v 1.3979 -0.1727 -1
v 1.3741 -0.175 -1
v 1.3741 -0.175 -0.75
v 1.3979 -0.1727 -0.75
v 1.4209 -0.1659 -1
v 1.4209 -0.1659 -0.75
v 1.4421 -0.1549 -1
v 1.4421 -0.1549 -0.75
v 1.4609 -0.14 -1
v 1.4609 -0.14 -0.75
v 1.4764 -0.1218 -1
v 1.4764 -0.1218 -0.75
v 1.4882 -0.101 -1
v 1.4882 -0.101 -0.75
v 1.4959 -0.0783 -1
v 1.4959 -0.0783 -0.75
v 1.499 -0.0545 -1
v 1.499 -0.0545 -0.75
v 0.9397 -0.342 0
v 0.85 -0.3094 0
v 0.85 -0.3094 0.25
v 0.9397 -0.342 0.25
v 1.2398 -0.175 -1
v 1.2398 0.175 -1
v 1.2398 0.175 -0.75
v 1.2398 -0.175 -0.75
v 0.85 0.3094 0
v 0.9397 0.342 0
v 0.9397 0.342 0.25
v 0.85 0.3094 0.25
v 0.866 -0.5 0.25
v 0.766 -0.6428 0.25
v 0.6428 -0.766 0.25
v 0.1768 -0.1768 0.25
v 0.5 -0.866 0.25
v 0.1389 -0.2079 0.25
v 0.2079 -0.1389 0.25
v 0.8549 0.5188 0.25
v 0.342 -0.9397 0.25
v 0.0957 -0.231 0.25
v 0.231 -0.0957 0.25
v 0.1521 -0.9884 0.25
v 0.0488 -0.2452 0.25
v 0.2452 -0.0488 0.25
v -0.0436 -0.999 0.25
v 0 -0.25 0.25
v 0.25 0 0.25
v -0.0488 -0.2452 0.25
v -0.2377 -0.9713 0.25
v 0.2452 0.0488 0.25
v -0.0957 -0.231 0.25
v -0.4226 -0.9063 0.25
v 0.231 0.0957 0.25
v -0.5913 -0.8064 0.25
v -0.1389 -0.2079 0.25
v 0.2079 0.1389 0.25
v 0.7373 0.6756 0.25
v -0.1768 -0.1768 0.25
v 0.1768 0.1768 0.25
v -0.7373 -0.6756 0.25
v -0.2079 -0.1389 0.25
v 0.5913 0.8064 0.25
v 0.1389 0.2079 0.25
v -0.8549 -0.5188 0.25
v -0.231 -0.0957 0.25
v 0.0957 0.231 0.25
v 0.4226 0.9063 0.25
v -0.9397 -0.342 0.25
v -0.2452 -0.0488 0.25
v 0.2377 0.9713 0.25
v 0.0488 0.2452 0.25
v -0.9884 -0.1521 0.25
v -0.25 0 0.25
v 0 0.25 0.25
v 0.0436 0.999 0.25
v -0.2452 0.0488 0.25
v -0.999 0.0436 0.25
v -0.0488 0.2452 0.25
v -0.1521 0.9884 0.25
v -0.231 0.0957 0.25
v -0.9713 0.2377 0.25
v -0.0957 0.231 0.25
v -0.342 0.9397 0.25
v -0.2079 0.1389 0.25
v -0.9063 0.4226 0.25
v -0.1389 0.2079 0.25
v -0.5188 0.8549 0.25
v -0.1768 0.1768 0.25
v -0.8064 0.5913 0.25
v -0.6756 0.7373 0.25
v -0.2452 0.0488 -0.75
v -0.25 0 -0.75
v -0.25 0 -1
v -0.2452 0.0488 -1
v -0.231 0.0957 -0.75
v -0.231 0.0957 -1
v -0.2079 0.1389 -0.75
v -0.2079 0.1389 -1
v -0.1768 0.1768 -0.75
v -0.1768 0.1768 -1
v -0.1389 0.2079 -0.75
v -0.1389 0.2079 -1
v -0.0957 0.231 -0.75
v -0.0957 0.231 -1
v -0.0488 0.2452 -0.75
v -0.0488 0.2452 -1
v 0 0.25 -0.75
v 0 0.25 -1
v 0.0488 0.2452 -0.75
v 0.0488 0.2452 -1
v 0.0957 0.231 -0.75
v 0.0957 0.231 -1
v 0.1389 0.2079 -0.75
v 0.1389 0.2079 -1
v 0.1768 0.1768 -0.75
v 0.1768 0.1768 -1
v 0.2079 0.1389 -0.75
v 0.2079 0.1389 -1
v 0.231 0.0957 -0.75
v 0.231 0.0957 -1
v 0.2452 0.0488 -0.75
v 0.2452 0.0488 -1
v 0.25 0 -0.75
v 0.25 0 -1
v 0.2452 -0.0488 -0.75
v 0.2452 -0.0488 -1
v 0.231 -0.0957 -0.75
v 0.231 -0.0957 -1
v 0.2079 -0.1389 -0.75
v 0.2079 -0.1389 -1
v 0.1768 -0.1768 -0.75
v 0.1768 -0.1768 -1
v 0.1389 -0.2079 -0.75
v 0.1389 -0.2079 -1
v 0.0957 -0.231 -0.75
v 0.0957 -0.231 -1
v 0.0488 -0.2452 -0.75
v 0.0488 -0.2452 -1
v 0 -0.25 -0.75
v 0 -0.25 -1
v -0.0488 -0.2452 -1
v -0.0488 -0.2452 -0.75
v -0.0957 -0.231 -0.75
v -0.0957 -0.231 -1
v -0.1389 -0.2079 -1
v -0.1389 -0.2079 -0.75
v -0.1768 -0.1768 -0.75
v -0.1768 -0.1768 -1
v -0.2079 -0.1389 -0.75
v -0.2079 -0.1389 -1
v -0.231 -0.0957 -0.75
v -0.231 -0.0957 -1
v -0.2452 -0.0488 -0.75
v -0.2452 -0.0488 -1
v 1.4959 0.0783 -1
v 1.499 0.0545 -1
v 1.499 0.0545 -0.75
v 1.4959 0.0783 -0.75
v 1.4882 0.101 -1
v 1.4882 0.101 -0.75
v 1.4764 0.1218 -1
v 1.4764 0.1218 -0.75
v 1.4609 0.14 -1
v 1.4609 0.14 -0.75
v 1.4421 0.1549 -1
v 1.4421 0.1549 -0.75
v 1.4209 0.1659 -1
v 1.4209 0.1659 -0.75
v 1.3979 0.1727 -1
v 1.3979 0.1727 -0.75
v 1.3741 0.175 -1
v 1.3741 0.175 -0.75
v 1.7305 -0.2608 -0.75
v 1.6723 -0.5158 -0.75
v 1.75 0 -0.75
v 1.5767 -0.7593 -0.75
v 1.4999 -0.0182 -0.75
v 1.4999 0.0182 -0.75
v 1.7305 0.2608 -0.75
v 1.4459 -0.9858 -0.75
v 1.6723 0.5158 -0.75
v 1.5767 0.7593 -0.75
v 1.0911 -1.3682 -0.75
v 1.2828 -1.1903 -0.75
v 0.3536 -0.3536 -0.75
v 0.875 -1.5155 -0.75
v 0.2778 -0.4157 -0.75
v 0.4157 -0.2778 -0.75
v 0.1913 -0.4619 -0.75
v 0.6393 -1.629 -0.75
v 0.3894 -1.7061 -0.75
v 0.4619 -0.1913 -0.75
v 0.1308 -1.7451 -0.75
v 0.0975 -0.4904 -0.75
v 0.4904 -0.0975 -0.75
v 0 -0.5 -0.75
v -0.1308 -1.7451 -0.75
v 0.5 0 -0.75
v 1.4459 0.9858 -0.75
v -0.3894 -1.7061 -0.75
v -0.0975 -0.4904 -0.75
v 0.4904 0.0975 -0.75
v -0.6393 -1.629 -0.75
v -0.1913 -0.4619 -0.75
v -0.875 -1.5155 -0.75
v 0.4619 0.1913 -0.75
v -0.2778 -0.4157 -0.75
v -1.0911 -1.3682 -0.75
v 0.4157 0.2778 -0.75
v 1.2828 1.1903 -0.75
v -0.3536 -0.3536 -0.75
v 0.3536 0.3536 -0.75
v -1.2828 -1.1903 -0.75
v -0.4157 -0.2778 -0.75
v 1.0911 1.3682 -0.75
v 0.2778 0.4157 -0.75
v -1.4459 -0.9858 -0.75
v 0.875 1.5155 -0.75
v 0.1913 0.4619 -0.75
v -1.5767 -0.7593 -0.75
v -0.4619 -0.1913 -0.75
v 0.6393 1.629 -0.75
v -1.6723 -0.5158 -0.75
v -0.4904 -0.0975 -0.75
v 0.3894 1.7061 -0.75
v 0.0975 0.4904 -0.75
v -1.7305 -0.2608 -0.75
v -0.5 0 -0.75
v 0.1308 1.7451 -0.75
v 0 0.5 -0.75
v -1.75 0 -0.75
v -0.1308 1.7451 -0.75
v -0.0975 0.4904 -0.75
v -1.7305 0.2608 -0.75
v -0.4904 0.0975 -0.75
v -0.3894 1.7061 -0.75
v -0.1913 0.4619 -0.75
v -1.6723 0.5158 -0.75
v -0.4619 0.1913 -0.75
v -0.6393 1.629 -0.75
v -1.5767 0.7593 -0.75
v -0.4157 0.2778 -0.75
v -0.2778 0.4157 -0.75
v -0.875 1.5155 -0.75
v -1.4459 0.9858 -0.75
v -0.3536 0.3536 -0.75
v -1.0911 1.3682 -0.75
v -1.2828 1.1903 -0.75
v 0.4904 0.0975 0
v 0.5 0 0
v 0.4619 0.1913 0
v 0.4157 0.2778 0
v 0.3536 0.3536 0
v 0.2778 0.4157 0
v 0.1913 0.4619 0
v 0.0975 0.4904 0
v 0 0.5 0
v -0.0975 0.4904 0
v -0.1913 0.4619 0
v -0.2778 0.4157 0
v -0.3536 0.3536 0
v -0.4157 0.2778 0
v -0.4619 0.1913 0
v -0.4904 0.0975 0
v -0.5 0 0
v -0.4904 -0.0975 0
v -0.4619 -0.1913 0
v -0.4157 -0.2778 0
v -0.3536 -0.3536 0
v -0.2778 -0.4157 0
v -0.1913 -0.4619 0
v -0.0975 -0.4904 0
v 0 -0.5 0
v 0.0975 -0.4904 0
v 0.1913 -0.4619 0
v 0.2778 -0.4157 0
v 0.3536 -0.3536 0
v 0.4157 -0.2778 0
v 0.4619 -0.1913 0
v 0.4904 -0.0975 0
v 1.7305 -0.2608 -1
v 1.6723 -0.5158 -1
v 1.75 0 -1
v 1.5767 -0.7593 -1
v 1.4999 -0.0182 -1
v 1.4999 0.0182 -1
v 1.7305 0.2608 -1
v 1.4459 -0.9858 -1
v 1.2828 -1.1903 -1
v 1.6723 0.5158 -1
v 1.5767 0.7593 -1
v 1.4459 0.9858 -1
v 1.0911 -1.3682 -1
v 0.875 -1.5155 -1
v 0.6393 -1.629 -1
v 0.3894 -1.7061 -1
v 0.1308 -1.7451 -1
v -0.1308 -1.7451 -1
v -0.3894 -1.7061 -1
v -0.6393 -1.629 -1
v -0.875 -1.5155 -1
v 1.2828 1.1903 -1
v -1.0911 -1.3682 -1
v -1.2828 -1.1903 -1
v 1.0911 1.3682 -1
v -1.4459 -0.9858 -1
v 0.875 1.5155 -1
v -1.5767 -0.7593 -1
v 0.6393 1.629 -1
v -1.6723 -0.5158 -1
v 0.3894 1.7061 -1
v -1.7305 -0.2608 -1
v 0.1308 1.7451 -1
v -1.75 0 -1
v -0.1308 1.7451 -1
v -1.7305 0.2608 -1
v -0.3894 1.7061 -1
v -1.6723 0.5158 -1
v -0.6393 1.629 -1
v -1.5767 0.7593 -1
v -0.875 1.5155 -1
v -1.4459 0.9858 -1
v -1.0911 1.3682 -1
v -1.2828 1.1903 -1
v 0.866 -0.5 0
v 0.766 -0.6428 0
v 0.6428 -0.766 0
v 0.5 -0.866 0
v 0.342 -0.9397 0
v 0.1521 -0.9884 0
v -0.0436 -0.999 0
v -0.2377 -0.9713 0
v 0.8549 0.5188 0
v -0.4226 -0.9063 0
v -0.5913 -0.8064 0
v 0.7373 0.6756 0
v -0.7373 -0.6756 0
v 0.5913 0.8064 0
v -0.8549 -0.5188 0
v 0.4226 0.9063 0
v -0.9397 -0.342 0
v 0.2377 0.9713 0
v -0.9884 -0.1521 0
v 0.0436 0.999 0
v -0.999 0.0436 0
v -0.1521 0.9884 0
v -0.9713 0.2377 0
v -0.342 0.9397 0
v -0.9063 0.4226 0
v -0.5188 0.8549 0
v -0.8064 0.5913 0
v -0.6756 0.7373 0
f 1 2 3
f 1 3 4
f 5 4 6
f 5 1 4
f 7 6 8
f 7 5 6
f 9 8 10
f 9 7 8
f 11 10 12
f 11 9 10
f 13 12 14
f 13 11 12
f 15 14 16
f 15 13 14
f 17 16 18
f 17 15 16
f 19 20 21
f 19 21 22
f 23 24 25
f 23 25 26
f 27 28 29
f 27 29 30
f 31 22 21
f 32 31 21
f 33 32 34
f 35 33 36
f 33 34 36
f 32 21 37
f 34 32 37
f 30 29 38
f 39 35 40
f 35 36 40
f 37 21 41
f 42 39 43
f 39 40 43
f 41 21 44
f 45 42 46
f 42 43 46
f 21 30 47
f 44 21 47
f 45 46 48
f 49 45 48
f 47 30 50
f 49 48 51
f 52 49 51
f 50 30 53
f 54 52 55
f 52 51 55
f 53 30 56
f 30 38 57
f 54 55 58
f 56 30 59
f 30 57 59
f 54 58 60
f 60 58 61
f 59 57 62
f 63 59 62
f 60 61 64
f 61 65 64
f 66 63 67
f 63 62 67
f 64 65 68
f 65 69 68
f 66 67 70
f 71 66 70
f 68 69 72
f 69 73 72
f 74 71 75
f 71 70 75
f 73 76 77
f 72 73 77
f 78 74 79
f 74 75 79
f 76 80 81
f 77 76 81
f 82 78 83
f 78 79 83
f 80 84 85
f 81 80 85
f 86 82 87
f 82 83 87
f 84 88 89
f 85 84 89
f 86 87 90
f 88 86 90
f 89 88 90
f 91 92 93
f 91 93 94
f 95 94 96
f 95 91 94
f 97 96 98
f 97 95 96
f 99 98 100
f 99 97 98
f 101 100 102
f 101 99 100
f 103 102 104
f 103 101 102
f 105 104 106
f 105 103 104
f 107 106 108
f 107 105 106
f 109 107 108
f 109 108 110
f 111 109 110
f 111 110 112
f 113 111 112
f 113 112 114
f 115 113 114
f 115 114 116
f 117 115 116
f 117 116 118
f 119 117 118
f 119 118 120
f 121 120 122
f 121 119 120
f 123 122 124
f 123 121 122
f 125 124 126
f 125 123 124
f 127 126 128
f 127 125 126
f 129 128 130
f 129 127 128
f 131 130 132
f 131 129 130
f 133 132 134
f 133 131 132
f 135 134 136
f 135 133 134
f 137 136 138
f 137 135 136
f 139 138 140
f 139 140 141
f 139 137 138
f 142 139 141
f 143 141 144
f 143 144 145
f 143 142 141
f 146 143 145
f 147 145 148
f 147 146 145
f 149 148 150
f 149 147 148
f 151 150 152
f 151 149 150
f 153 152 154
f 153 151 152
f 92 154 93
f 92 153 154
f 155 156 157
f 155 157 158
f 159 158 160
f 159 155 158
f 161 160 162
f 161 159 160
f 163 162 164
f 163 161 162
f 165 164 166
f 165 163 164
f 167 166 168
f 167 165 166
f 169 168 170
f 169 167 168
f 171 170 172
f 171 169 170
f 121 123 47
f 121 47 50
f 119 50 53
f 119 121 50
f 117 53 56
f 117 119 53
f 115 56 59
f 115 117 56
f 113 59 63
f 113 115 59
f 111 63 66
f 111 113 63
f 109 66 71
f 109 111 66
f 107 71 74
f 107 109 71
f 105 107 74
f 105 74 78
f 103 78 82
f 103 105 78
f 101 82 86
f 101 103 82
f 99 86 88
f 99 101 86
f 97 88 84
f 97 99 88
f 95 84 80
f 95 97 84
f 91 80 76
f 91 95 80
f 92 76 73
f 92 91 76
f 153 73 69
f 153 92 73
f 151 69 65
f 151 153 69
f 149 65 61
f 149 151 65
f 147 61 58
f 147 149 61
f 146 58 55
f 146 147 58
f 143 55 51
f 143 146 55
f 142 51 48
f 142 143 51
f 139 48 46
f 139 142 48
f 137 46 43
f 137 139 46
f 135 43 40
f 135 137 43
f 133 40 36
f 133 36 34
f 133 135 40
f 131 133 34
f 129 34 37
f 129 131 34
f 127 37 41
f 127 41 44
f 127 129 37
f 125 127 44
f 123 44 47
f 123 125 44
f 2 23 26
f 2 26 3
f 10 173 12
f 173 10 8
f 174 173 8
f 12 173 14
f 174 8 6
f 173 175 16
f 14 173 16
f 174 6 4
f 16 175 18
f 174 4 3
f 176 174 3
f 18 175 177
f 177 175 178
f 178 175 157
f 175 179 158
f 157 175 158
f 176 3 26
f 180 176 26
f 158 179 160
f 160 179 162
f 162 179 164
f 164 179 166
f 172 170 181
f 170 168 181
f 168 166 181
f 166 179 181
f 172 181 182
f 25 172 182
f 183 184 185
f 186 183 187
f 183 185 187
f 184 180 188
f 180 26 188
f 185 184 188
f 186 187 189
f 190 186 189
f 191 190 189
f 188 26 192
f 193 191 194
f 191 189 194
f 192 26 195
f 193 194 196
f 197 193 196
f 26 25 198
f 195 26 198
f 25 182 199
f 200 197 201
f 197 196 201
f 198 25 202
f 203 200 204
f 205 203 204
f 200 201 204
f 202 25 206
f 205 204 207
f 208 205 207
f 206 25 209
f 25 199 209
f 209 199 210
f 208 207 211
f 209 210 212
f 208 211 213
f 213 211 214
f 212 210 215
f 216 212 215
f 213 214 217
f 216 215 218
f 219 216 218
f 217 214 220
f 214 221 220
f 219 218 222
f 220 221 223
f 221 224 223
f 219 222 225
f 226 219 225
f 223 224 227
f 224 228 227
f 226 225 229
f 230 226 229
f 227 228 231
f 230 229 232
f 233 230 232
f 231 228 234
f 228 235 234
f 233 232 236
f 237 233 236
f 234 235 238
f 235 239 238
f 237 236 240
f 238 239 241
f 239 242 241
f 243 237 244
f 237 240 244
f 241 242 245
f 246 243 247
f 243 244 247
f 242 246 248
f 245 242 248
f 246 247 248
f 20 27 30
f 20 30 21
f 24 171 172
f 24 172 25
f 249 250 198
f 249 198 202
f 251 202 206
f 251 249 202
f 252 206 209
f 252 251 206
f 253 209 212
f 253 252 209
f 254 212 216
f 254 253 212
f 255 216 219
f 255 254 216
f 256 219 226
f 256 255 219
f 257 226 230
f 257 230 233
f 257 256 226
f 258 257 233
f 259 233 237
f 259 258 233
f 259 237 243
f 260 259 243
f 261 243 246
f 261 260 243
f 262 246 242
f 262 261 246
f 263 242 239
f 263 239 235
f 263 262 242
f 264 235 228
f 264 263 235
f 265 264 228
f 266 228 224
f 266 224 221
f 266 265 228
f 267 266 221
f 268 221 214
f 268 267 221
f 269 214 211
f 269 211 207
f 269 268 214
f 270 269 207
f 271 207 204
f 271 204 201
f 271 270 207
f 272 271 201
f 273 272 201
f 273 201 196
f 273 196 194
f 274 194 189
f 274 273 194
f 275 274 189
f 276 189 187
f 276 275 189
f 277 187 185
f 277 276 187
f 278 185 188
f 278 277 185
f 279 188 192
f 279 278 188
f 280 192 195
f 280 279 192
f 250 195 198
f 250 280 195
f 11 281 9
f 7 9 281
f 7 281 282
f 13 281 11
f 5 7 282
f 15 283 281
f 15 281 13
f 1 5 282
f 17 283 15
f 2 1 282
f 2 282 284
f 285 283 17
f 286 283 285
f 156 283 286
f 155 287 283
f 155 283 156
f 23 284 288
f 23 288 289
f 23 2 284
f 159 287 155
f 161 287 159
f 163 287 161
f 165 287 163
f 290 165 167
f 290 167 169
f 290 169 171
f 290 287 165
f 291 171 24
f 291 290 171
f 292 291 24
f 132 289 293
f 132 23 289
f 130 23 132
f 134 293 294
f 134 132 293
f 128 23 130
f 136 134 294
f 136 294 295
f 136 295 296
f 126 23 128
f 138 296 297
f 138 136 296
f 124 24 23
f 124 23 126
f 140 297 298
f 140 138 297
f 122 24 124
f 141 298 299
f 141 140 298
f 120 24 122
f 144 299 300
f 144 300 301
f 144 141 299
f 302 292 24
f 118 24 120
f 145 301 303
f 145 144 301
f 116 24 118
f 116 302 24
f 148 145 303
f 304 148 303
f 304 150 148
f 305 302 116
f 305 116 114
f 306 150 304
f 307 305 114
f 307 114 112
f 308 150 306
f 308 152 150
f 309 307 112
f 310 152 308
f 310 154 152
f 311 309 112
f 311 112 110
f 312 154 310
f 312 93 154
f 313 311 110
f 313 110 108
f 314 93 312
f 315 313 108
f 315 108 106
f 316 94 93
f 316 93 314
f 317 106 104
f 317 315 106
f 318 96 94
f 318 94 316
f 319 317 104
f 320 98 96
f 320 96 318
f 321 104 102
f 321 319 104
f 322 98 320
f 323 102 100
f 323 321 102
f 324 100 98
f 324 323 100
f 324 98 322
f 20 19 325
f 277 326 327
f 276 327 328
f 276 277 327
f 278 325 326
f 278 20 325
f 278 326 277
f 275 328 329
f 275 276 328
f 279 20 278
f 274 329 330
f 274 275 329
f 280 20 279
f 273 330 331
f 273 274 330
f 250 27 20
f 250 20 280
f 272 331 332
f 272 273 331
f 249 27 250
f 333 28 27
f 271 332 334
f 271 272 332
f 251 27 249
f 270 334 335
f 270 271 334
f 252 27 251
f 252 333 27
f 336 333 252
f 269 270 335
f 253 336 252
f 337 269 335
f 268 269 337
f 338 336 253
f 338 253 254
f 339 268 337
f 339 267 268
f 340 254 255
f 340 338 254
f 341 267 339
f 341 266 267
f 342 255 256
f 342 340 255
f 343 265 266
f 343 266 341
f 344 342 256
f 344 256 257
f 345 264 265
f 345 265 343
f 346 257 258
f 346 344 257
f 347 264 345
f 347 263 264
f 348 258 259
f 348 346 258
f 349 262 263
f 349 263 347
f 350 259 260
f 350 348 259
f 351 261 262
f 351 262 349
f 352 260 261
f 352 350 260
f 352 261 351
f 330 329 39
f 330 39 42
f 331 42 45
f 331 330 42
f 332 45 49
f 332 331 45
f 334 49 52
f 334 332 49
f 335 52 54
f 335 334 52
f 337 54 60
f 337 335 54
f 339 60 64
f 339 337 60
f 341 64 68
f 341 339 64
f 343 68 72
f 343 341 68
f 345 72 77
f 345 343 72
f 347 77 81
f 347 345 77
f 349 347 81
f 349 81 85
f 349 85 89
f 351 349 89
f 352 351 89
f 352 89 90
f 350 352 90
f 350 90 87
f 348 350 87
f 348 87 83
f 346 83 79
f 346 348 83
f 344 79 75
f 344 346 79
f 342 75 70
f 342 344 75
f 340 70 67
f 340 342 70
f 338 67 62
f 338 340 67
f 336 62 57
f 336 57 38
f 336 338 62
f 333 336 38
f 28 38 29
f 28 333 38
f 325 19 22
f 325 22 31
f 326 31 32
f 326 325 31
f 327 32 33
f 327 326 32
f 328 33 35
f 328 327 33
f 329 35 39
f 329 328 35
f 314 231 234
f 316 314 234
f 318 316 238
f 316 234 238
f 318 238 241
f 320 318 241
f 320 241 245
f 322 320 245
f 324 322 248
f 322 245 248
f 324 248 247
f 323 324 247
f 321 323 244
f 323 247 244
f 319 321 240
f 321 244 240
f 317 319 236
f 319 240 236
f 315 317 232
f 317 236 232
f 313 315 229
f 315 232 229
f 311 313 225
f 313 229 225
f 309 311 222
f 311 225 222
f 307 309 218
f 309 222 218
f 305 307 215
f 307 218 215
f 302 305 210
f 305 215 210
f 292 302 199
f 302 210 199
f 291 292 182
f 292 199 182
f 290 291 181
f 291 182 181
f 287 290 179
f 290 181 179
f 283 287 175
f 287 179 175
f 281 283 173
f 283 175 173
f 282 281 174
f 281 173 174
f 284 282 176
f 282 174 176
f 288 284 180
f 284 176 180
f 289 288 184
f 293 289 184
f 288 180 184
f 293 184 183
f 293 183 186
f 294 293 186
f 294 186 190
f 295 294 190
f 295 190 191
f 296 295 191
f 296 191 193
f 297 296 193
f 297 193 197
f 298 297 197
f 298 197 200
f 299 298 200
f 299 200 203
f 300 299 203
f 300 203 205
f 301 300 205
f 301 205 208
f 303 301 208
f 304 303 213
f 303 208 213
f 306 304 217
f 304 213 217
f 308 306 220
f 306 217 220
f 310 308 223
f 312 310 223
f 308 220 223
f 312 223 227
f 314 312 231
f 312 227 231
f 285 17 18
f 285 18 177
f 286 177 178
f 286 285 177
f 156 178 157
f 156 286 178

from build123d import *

# Parameters (mm, degrees)
CROQUIS1_R              = 0.5
CROQUIS1_R_2            = 0.25
SALIENTE_EXTRUIR1_DEPTH = 0.75
CROQUIS2_R              = 0.25
SALIENTE_EXTRUIR2_DEPTH = 0.25
CROQUIS3_R              = 1.75
CROQUIS3_R_2            = 0.25
SALIENTE_EXTRUIR3_DEPTH = 0.25
CORTAR_EXTRUIR1_REACH   = 3.25


with BuildPart() as part:
    # Croquis1 → Saliente-Extruir1 (new body)
    with BuildSketch(Plane.XY):
        Circle(CROQUIS1_R)
        Circle(CROQUIS1_R_2, mode=Mode.SUBTRACT)
    extrude(amount=-SALIENTE_EXTRUIR1_DEPTH)

    # Croquis2 → Saliente-Extruir2 (add)
    with BuildSketch(Plane.XY):
        with BuildLine():
            Line((0.85, 0.309374699), (0.85, -0.309374699))
            Line((0.85, -0.309374699), (0.939692621, -0.342020143))
            ThreePointArc((0.939692621, -0.342020143), (0.707106781, -0.707106781), (0.342020143, -0.939692621))
            ThreePointArc((0.342020143, -0.939692621), (-0.906307787, 0.422618262), (0.939692621, 0.342020143))
            Line((0.939692621, 0.342020143), (0.85, 0.309374699))
        make_face()
        Circle(CROQUIS2_R, mode=Mode.SUBTRACT)
    extrude(amount=SALIENTE_EXTRUIR2_DEPTH)

    # Croquis3 → Saliente-Extruir3 (add)
    with BuildSketch(Plane(origin=(0, 0, -0.75), x_dir=(-1, 0, 0), z_dir=(0, 0, -1))):
        Circle(CROQUIS3_R)
        Circle(CROQUIS3_R_2, mode=Mode.SUBTRACT)
    extrude(amount=SALIENTE_EXTRUIR3_DEPTH)

    # Croquis4 → Cortar-Extruir1 (cut, up to next)
    with BuildSketch(Plane(origin=(0, 0, -1), x_dir=(-1, 0, 0), z_dir=(0, 0, -1)), mode=Mode.PRIVATE) as cortar_extruir1_sk1:
        with BuildLine():
            Line((-1.374090608, 0.175), (-1.239756692, 0.175))
            Line((-1.239756692, 0.175), (-1.239756692, -0.175))
            Line((-1.239756692, -0.175), (-1.374090608, -0.175))
            ThreePointArc((-1.374090608, -0.175), (-1.460857014, -0.139981059), (-1.499007936, -0.054545455))
            ThreePointArc((-1.499007936, -0.054545455), (-1.5, 0), (-1.499007936, 0.054545455))
            ThreePointArc((-1.499007936, 0.054545455), (-1.460857014, 0.139981059), (-1.374090608, 0.175))
        make_face()
    cortar_extruir1_tool1 = extrude(cortar_extruir1_sk1.sketch, amount=-CORTAR_EXTRUIR1_REACH, mode=Mode.PRIVATE) & part.part
    add(cortar_extruir1_tool1.solids().sort_by_distance((1.361411, 0, -1))[0], mode=Mode.SUBTRACT)


solid = part.part
